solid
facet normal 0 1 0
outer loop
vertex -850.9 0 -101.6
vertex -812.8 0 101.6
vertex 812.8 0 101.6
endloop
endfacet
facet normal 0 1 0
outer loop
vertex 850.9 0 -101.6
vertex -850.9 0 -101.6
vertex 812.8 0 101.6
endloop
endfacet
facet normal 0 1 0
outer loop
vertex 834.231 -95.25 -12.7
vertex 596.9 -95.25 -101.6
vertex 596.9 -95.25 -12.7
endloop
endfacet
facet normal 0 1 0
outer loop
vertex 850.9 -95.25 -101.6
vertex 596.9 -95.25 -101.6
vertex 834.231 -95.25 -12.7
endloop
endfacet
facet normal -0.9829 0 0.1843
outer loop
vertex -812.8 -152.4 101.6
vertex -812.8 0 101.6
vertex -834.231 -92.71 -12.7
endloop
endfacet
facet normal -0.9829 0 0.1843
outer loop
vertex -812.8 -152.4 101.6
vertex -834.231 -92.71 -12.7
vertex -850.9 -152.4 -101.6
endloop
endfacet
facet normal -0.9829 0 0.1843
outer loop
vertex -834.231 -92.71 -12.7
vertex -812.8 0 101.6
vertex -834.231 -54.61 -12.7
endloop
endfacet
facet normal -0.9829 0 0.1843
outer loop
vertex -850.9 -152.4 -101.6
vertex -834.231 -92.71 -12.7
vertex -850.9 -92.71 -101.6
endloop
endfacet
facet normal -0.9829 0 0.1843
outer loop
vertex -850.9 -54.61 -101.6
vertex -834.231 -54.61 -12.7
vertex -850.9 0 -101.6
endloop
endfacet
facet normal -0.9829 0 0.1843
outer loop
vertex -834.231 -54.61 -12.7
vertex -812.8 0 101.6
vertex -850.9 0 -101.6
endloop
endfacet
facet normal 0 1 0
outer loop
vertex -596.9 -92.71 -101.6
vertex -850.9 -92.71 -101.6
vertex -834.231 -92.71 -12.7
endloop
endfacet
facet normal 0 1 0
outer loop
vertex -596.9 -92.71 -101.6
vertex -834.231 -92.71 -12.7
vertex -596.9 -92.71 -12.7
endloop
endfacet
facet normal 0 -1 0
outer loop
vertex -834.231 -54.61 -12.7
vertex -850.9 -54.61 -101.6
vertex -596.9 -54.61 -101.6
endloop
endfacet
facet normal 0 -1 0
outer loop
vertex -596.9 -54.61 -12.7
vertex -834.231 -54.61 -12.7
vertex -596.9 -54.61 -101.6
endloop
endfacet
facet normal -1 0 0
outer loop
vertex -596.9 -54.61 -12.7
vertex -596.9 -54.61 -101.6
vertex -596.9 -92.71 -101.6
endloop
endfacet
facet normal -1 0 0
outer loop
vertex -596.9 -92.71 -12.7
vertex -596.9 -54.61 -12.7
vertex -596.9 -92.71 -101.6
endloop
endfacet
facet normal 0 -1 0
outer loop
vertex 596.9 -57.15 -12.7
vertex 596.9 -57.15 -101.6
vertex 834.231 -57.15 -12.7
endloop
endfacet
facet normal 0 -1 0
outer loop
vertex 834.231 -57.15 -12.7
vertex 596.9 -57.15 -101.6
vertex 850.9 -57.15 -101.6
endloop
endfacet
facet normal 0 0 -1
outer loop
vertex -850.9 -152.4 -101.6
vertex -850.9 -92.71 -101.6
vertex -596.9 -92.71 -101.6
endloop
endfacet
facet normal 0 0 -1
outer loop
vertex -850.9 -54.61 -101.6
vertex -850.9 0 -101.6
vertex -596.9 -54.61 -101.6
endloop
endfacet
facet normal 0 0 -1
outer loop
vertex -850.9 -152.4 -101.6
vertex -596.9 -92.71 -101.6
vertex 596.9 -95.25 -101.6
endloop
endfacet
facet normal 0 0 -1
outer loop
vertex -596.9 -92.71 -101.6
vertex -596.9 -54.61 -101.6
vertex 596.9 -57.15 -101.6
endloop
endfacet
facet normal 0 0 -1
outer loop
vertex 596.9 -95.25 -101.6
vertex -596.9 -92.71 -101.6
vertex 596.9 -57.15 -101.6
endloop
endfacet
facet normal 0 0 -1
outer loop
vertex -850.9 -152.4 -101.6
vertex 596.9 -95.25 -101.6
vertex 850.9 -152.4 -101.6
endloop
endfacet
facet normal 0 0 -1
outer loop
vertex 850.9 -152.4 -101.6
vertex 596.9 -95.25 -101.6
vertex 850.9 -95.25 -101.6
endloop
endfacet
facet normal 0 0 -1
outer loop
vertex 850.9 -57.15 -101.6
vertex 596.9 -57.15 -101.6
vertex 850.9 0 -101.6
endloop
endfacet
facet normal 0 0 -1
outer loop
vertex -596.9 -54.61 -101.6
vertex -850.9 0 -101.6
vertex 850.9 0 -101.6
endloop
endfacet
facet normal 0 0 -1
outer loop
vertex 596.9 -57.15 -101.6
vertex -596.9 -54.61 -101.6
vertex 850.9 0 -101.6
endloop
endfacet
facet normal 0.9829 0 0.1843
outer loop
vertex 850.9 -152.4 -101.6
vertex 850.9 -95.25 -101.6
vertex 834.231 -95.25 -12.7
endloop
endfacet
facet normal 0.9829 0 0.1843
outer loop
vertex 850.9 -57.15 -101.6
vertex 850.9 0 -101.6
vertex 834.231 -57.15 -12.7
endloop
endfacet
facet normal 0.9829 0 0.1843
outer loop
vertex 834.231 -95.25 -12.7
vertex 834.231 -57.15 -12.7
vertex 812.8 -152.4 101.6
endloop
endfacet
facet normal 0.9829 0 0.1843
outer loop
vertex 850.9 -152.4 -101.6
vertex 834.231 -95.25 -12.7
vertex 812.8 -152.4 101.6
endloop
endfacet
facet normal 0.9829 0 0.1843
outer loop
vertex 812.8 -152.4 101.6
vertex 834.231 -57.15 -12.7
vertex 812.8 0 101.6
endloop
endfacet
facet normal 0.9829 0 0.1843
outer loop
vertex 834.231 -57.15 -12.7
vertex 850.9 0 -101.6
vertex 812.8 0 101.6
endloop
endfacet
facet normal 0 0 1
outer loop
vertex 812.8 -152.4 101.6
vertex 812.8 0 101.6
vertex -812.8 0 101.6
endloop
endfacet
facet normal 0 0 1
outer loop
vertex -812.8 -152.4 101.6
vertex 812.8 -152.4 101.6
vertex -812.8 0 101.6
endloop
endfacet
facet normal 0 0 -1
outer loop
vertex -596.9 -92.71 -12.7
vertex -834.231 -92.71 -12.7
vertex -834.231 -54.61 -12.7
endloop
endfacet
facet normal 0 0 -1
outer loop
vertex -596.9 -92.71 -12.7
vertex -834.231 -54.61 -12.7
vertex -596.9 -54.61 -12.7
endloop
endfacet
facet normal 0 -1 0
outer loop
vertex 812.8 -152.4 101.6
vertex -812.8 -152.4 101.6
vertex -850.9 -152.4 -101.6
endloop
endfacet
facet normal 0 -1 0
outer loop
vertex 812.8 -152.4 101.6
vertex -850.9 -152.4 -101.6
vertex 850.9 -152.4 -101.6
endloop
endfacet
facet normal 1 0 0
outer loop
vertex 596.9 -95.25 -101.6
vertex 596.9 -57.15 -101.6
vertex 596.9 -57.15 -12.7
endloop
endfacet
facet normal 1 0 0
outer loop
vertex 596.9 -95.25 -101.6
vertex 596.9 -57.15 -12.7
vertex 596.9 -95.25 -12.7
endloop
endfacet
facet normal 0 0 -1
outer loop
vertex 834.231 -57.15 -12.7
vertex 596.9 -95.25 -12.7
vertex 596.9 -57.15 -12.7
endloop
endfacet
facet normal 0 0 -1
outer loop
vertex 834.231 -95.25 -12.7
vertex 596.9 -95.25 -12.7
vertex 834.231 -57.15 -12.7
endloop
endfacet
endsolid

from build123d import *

# Parameters (mm, degrees)
F1_DEPTH = 152.4
F2_W     = 254
F2_H     = 38.1
F3_DEPTH = 88.9


with BuildPart() as f1:
    # F0 (on Front) → F1 (new body)
    with BuildSketch(Plane.XZ):
        Polygon((812.8, 101.6), (-812.8, 101.6), (-850.9, -101.6), (850.9, -101.6), align=None)
    extrude(amount=F1_DEPTH)

    # F2 (on face) → F3 (cut)
    with BuildSketch(Plane(origin=(0, 0, -101.6), x_dir=(1, 0, 0), z_dir=(0, 0, -1))):
        with Locations((-723.9, 73.66)):
            Rectangle(F2_W, F2_H)
        with Locations((723.9, 76.2)):
            Rectangle(F2_W, F2_H)
    extrude(amount=-F3_DEPTH, mode=Mode.SUBTRACT)


solid = f1.part
